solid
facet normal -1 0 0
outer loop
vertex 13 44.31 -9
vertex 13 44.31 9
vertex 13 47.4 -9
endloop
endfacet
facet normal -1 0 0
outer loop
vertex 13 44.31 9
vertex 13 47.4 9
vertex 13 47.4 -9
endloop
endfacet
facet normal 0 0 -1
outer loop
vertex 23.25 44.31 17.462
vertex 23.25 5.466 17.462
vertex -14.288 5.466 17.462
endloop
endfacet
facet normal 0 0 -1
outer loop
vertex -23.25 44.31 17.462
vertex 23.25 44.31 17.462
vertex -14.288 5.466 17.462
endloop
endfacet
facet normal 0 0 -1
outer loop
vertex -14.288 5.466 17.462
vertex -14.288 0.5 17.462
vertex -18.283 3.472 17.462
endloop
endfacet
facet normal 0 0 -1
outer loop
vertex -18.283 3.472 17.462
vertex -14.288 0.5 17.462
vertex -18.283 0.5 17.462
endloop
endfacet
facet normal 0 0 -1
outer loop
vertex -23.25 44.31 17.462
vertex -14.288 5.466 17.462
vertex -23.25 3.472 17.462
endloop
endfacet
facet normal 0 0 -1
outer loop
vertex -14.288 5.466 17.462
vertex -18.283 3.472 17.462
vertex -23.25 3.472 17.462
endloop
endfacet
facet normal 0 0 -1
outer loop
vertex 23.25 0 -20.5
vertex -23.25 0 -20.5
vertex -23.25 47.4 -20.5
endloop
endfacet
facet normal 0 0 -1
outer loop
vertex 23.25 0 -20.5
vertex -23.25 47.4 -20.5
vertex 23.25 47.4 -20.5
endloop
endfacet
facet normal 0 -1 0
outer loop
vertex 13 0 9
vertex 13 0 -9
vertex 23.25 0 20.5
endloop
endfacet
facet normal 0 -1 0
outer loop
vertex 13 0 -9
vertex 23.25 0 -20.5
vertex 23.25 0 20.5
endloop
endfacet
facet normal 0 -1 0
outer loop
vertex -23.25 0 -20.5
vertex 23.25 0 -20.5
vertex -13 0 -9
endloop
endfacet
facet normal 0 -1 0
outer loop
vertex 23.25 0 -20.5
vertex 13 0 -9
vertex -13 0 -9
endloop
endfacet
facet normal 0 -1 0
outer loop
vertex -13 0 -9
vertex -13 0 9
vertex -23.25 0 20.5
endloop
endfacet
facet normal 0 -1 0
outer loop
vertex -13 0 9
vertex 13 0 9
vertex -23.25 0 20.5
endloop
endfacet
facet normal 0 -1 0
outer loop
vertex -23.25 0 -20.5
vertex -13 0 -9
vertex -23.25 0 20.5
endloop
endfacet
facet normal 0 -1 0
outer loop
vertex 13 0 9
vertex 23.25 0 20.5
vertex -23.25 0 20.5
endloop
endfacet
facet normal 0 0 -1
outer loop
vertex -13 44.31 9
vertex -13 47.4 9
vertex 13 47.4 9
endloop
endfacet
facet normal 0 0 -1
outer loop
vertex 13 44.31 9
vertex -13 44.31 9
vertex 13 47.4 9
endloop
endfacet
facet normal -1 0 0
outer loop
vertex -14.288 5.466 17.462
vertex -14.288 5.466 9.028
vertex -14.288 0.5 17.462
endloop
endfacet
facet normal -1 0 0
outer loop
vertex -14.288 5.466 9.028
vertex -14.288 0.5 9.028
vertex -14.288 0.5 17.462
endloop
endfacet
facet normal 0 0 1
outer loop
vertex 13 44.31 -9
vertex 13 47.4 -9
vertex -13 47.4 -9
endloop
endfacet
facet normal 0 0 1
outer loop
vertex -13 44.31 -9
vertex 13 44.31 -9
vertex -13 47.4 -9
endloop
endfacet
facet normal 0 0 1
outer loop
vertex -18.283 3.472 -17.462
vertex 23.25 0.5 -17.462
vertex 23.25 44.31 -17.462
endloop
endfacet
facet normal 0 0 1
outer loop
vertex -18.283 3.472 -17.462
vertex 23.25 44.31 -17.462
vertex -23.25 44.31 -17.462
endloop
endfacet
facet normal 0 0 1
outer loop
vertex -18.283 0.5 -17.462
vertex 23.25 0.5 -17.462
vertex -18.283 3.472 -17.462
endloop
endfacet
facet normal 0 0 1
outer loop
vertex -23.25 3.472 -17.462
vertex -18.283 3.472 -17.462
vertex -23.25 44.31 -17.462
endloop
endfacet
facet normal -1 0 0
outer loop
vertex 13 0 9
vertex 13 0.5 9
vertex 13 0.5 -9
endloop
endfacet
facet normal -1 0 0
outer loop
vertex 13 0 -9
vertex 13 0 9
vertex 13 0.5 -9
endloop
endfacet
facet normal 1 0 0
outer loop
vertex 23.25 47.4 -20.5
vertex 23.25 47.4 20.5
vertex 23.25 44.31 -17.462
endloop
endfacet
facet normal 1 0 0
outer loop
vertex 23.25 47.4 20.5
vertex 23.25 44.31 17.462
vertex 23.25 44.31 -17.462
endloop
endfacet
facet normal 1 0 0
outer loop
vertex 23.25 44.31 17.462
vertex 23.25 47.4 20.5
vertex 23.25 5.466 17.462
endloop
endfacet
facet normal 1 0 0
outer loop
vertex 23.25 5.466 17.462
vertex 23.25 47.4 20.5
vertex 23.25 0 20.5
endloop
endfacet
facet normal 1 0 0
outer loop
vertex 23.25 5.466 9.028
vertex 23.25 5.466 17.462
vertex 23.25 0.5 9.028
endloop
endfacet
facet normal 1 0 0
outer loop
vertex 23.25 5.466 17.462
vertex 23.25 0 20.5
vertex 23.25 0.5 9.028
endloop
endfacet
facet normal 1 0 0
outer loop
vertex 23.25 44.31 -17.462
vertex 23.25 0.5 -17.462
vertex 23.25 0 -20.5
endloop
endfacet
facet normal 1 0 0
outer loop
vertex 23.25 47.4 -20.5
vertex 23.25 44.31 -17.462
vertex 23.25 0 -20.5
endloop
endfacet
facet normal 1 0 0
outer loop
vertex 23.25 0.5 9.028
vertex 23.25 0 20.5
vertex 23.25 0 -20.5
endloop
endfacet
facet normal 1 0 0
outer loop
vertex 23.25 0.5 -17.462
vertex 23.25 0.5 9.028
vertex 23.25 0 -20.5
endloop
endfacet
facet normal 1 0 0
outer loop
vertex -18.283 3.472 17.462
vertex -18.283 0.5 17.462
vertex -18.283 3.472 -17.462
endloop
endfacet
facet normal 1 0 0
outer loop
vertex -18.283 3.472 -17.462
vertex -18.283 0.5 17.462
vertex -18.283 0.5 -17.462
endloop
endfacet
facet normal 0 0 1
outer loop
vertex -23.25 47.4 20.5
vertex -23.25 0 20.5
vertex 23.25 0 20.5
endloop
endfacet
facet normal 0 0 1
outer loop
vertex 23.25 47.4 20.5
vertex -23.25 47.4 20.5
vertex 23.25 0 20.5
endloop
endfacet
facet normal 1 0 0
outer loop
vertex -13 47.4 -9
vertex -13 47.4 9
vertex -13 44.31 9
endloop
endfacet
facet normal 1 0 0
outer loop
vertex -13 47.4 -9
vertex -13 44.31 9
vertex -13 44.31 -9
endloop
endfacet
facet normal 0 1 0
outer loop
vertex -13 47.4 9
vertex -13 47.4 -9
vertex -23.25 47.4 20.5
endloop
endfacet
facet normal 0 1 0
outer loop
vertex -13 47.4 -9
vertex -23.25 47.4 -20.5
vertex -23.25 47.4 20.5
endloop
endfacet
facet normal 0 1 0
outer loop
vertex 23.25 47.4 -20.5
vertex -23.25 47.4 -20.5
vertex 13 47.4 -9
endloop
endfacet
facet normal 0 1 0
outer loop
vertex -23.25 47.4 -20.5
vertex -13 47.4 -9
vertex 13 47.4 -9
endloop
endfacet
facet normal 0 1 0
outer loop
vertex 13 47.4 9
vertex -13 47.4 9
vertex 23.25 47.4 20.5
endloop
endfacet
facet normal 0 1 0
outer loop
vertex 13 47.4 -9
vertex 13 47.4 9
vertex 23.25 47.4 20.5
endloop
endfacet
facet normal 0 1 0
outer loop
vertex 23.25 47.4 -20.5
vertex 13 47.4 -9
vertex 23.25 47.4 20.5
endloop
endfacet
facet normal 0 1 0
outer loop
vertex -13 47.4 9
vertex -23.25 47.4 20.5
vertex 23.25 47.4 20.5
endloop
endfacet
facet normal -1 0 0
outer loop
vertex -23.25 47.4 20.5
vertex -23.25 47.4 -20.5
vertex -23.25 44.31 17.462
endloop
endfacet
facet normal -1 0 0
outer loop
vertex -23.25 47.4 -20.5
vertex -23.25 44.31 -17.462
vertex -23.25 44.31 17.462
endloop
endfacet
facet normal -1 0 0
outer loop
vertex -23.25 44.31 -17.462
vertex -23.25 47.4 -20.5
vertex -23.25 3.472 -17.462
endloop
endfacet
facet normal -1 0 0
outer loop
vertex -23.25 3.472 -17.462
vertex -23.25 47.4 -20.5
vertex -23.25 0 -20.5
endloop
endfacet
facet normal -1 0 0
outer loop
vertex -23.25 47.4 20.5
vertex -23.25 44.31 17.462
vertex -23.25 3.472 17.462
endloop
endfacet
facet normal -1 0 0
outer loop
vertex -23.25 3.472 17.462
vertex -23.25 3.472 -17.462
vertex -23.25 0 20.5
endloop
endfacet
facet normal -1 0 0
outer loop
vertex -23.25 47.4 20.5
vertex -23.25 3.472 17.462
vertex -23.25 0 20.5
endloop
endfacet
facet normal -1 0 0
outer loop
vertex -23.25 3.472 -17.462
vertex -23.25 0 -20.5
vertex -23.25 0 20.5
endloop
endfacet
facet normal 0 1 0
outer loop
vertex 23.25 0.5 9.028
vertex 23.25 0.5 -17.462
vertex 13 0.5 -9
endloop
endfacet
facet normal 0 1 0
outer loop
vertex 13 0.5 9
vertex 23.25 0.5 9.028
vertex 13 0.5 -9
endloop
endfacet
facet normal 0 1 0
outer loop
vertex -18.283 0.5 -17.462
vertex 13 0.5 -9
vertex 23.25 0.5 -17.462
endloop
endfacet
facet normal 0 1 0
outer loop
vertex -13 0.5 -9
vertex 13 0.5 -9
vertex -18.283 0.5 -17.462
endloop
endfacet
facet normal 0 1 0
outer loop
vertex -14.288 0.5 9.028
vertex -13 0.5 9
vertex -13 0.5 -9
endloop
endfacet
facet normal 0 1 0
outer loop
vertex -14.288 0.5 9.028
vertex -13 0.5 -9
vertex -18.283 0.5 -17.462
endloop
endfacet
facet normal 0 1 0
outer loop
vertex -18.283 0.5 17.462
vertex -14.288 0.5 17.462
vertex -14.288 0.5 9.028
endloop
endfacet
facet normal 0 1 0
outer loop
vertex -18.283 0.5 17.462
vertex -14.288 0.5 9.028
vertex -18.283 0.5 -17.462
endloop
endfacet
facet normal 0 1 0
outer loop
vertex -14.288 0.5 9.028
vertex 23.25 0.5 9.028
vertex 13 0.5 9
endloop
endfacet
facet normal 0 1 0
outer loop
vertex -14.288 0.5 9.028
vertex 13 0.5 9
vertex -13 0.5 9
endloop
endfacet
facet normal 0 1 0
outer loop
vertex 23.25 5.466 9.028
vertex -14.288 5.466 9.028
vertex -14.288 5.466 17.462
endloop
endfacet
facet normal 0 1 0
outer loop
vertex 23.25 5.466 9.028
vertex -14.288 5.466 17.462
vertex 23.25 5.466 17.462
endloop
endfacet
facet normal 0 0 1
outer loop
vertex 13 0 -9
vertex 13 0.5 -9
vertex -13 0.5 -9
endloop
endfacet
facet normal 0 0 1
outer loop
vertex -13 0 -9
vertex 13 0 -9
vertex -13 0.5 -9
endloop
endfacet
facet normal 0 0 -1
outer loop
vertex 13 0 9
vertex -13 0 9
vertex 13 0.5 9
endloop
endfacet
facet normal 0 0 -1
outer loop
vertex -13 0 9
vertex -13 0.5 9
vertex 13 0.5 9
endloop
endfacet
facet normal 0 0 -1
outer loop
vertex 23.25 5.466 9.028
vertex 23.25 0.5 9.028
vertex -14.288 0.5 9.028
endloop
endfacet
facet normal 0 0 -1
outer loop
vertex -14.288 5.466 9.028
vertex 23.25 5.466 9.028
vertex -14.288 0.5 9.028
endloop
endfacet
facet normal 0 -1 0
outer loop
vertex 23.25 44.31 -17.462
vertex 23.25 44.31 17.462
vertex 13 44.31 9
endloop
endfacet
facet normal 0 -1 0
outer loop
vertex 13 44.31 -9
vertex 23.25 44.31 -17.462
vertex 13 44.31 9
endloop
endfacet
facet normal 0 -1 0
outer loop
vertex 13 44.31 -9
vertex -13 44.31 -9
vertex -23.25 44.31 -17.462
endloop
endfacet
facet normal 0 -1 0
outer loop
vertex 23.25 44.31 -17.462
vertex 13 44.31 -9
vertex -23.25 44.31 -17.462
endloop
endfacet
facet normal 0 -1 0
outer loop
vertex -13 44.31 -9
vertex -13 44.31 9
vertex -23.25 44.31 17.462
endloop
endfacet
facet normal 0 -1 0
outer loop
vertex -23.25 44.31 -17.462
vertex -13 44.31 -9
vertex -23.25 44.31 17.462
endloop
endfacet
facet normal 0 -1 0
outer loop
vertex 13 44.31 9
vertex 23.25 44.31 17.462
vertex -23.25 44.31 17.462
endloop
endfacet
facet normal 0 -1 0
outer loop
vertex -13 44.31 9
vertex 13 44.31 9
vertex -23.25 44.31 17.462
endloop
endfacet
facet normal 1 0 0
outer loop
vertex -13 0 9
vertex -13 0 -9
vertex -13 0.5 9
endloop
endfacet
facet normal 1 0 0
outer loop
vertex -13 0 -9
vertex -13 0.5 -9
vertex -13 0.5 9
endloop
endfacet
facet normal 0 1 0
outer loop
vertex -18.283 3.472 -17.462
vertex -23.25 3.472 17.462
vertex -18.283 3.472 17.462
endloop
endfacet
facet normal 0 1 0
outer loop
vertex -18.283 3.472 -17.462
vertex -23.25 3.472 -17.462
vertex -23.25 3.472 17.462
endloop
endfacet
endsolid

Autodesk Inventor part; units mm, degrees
ref_plane "YZ Plane" through (0, 0, 0) normal (1, 0, 0) x (0, 1, 0)
ref_plane "XZ Plane" through (0, 0, 0) normal (0, 1, 0) x (-1, 0, 0)
ref_plane "XY Plane" through (0, 0, 0) normal (0, 0, 1) x (1, 0, 0)
sketch "Sketch1" plane through (0, 0, 0) normal (0, 1, 0) x (-1, 0, 0)
  point P0 (0, 0)
sketch "Sketch2" plane through (0, 0, 0) normal (0, 1, 0) x (-1, 0, 0)
  line L0 (23.25, -20.5) -> (-23.25, -20.5)
  line L1 (-23.25, -20.5) -> (-23.25, 20.5)
  line L2 (-23.25, 20.5) -> (23.25, 20.5)
  line L3 (23.25, 20.5) -> (23.25, -20.5)
  line L4 (23.25, -20.5) -> (-23.25, 20.5) construction
  line L5 (-23.25, -20.5) -> (23.25, 20.5) construction
  point P0 (0, 0)
  dimension "d0" = 46.5
  dimension "d1" = 41
extrude "Extrusion1" add sketch "Sketch2" along normal blind 0.5
sketch "Sketch3" plane through (0, 0.5, 0) normal (0, 1, 0) x (1, 0, 0)
  line L0 (-13, -9) -> (13, -9)
  line L1 (13, -9) -> (13, 9)
  line L2 (13, 9) -> (-13, 9)
  line L3 (-13, 9) -> (-13, -9)
  line L4 (-13, -9) -> (13, 9) construction
  line L5 (13, -9) -> (-13, 9) construction
  point P0 (0, 0)
  dimension "d4" = 26
  dimension "d5" = 18
extrude "Extrusion2" cut sketch "Sketch3" against normal blind 25.4
sketch "Sketch4" plane through (0, 0.5, 0) normal (0, 1, 0) x (1, 0, 0)
  line L0 (-23.25, 20.5) -> (-23.25, -20.5) projected
  line L1 (23.25, -20.5) -> (23.25, 20.5) projected
  line L2 (-23.25, -20.5) -> (23.25, -20.5)
  line L3 (23.25, -20.5) -> (23.25, -17.4625)
  line L4 (23.25, -17.4625) -> (-23.25, -17.4625)
  line L5 (-23.25, -17.4625) -> (-23.25, -20.5)
  point P0 (0, 0)
extrude "Extrusion3" add sketch "Sketch4" along normal blind 46.9
sketch "Sketch5" plane through (0, 0.5, 0) normal (0, 1, 0) x (1, 0, 0)
  line L0 (-23.25, 20.5) -> (-23.25, -17.4625) projected
  line L1 (-23.25, 20.5) -> (23.25, 20.5)
  line L2 (23.25, 20.5) -> (23.25, 17.4625)
  line L3 (23.25, 17.4625) -> (-23.25, 17.4625)
  line L4 (-23.25, 17.4625) -> (-23.25, 20.5)
  point P0 (0, 0)
extrude "Extrusion4" add sketch "Sketch5" along normal blind 46.9
sketch "Sketch6" plane through (23.25, 0.5, 17.4625) normal (0, 0, -1) x (-1, 0, 0)
  point P0 (23.25, -0.5)
sketch "Sketch7" plane through (23.25, 0.5, 17.4625) normal (0, 0, -1) x (-1, 0, 0)
  point P0 (23.25, -0.5)
sketch "Sketch8" plane through (23.25, 0.5, 17.4625) normal (0, 0, -1) x (-1, 0, 0)
  line L0 (46.5, 0) -> (46.5, 46.9) projected
  line L1 (0, 0) -> (0, 46.9) projected
  line L2 (46.5, 46.9) -> (0, 46.9)
  line L3 (0, 46.9) -> (0, 43.8105)
  line L4 (0, 43.8105) -> (46.5, 43.8105)
  line L5 (46.5, 43.8105) -> (46.5, 46.9)
  point P0 (23.25, -0.5)
extrude "Extrusion5" add sketch "Sketch8" along normal blind 35
sketch "Sketch9" plane through (0, 47.4, 0) normal (0, 1, 0) x (1, 0, 0)
  line L0 (-13, -9) -> (-13, 9) projected
  line L1 (13, 9) -> (-13, 9)
  line L2 (-13, 9) -> (-13, -9)
  line L3 (-13, -9) -> (13, -9)
  line L4 (13, -9) -> (13, 9)
  line L5 (13, 9) -> (-13, -9) construction
  line L6 (-13, 9) -> (13, -9) construction
  point P0 (0, 0)
sketch "Sketch10" plane through (0, 0.5, 0) normal (0, 1, 0) x (1, 0, 0)
  point P0 (0, 0)
sketch "Sketch11" plane through (0, 0.5, 0) normal (0, 1, 0) x (1, 0, 0)
  line L0 (-23.25, -17.4625) -> (23.25, -17.4625) projected
  line L1 (-23.25, -17.4625) -> (-18.283, -17.4625)
  line L2 (-18.283, -17.4625) -> (-18.283, 17.4625)
  line L3 (-18.283, 17.4625) -> (-23.25, 17.4625)
  line L4 (-23.25, 17.4625) -> (-23.25, -17.4625)
  point P0 (0, 0)
extrude "Extrusion6" add sketch "Sketch11" along normal blind 2.9718
extrude "Extrusion7" cut sketch "Sketch9" against normal blind 4.9657
sketch "Sketch12" plane through (0, 0.5, 0) normal (0, 1, 0) x (1, 0, 0)
  point P0 (0, 0)
sketch "Sketch13" plane through (0, 0.5, 0) normal (0, 1, 0) x (1, 0, 0)
  line L0 (23.25, -17.4625) -> (23.25, 17.4625) projected
  line L1 (-14.2875, -17.4625) -> (23.25, -17.4625)
  line L2 (23.25, -17.4625) -> (23.25, -9.0284)
  line L3 (23.25, -9.0284) -> (-14.2875, -9.0284)
  line L4 (-14.2875, -9.0284) -> (-14.2875, -17.4625)
  point P0 (0, 0)
extrude "Extrusion8" add sketch "Sketch13" along normal blind 4.9657
properties part number "ChamberSurface"
